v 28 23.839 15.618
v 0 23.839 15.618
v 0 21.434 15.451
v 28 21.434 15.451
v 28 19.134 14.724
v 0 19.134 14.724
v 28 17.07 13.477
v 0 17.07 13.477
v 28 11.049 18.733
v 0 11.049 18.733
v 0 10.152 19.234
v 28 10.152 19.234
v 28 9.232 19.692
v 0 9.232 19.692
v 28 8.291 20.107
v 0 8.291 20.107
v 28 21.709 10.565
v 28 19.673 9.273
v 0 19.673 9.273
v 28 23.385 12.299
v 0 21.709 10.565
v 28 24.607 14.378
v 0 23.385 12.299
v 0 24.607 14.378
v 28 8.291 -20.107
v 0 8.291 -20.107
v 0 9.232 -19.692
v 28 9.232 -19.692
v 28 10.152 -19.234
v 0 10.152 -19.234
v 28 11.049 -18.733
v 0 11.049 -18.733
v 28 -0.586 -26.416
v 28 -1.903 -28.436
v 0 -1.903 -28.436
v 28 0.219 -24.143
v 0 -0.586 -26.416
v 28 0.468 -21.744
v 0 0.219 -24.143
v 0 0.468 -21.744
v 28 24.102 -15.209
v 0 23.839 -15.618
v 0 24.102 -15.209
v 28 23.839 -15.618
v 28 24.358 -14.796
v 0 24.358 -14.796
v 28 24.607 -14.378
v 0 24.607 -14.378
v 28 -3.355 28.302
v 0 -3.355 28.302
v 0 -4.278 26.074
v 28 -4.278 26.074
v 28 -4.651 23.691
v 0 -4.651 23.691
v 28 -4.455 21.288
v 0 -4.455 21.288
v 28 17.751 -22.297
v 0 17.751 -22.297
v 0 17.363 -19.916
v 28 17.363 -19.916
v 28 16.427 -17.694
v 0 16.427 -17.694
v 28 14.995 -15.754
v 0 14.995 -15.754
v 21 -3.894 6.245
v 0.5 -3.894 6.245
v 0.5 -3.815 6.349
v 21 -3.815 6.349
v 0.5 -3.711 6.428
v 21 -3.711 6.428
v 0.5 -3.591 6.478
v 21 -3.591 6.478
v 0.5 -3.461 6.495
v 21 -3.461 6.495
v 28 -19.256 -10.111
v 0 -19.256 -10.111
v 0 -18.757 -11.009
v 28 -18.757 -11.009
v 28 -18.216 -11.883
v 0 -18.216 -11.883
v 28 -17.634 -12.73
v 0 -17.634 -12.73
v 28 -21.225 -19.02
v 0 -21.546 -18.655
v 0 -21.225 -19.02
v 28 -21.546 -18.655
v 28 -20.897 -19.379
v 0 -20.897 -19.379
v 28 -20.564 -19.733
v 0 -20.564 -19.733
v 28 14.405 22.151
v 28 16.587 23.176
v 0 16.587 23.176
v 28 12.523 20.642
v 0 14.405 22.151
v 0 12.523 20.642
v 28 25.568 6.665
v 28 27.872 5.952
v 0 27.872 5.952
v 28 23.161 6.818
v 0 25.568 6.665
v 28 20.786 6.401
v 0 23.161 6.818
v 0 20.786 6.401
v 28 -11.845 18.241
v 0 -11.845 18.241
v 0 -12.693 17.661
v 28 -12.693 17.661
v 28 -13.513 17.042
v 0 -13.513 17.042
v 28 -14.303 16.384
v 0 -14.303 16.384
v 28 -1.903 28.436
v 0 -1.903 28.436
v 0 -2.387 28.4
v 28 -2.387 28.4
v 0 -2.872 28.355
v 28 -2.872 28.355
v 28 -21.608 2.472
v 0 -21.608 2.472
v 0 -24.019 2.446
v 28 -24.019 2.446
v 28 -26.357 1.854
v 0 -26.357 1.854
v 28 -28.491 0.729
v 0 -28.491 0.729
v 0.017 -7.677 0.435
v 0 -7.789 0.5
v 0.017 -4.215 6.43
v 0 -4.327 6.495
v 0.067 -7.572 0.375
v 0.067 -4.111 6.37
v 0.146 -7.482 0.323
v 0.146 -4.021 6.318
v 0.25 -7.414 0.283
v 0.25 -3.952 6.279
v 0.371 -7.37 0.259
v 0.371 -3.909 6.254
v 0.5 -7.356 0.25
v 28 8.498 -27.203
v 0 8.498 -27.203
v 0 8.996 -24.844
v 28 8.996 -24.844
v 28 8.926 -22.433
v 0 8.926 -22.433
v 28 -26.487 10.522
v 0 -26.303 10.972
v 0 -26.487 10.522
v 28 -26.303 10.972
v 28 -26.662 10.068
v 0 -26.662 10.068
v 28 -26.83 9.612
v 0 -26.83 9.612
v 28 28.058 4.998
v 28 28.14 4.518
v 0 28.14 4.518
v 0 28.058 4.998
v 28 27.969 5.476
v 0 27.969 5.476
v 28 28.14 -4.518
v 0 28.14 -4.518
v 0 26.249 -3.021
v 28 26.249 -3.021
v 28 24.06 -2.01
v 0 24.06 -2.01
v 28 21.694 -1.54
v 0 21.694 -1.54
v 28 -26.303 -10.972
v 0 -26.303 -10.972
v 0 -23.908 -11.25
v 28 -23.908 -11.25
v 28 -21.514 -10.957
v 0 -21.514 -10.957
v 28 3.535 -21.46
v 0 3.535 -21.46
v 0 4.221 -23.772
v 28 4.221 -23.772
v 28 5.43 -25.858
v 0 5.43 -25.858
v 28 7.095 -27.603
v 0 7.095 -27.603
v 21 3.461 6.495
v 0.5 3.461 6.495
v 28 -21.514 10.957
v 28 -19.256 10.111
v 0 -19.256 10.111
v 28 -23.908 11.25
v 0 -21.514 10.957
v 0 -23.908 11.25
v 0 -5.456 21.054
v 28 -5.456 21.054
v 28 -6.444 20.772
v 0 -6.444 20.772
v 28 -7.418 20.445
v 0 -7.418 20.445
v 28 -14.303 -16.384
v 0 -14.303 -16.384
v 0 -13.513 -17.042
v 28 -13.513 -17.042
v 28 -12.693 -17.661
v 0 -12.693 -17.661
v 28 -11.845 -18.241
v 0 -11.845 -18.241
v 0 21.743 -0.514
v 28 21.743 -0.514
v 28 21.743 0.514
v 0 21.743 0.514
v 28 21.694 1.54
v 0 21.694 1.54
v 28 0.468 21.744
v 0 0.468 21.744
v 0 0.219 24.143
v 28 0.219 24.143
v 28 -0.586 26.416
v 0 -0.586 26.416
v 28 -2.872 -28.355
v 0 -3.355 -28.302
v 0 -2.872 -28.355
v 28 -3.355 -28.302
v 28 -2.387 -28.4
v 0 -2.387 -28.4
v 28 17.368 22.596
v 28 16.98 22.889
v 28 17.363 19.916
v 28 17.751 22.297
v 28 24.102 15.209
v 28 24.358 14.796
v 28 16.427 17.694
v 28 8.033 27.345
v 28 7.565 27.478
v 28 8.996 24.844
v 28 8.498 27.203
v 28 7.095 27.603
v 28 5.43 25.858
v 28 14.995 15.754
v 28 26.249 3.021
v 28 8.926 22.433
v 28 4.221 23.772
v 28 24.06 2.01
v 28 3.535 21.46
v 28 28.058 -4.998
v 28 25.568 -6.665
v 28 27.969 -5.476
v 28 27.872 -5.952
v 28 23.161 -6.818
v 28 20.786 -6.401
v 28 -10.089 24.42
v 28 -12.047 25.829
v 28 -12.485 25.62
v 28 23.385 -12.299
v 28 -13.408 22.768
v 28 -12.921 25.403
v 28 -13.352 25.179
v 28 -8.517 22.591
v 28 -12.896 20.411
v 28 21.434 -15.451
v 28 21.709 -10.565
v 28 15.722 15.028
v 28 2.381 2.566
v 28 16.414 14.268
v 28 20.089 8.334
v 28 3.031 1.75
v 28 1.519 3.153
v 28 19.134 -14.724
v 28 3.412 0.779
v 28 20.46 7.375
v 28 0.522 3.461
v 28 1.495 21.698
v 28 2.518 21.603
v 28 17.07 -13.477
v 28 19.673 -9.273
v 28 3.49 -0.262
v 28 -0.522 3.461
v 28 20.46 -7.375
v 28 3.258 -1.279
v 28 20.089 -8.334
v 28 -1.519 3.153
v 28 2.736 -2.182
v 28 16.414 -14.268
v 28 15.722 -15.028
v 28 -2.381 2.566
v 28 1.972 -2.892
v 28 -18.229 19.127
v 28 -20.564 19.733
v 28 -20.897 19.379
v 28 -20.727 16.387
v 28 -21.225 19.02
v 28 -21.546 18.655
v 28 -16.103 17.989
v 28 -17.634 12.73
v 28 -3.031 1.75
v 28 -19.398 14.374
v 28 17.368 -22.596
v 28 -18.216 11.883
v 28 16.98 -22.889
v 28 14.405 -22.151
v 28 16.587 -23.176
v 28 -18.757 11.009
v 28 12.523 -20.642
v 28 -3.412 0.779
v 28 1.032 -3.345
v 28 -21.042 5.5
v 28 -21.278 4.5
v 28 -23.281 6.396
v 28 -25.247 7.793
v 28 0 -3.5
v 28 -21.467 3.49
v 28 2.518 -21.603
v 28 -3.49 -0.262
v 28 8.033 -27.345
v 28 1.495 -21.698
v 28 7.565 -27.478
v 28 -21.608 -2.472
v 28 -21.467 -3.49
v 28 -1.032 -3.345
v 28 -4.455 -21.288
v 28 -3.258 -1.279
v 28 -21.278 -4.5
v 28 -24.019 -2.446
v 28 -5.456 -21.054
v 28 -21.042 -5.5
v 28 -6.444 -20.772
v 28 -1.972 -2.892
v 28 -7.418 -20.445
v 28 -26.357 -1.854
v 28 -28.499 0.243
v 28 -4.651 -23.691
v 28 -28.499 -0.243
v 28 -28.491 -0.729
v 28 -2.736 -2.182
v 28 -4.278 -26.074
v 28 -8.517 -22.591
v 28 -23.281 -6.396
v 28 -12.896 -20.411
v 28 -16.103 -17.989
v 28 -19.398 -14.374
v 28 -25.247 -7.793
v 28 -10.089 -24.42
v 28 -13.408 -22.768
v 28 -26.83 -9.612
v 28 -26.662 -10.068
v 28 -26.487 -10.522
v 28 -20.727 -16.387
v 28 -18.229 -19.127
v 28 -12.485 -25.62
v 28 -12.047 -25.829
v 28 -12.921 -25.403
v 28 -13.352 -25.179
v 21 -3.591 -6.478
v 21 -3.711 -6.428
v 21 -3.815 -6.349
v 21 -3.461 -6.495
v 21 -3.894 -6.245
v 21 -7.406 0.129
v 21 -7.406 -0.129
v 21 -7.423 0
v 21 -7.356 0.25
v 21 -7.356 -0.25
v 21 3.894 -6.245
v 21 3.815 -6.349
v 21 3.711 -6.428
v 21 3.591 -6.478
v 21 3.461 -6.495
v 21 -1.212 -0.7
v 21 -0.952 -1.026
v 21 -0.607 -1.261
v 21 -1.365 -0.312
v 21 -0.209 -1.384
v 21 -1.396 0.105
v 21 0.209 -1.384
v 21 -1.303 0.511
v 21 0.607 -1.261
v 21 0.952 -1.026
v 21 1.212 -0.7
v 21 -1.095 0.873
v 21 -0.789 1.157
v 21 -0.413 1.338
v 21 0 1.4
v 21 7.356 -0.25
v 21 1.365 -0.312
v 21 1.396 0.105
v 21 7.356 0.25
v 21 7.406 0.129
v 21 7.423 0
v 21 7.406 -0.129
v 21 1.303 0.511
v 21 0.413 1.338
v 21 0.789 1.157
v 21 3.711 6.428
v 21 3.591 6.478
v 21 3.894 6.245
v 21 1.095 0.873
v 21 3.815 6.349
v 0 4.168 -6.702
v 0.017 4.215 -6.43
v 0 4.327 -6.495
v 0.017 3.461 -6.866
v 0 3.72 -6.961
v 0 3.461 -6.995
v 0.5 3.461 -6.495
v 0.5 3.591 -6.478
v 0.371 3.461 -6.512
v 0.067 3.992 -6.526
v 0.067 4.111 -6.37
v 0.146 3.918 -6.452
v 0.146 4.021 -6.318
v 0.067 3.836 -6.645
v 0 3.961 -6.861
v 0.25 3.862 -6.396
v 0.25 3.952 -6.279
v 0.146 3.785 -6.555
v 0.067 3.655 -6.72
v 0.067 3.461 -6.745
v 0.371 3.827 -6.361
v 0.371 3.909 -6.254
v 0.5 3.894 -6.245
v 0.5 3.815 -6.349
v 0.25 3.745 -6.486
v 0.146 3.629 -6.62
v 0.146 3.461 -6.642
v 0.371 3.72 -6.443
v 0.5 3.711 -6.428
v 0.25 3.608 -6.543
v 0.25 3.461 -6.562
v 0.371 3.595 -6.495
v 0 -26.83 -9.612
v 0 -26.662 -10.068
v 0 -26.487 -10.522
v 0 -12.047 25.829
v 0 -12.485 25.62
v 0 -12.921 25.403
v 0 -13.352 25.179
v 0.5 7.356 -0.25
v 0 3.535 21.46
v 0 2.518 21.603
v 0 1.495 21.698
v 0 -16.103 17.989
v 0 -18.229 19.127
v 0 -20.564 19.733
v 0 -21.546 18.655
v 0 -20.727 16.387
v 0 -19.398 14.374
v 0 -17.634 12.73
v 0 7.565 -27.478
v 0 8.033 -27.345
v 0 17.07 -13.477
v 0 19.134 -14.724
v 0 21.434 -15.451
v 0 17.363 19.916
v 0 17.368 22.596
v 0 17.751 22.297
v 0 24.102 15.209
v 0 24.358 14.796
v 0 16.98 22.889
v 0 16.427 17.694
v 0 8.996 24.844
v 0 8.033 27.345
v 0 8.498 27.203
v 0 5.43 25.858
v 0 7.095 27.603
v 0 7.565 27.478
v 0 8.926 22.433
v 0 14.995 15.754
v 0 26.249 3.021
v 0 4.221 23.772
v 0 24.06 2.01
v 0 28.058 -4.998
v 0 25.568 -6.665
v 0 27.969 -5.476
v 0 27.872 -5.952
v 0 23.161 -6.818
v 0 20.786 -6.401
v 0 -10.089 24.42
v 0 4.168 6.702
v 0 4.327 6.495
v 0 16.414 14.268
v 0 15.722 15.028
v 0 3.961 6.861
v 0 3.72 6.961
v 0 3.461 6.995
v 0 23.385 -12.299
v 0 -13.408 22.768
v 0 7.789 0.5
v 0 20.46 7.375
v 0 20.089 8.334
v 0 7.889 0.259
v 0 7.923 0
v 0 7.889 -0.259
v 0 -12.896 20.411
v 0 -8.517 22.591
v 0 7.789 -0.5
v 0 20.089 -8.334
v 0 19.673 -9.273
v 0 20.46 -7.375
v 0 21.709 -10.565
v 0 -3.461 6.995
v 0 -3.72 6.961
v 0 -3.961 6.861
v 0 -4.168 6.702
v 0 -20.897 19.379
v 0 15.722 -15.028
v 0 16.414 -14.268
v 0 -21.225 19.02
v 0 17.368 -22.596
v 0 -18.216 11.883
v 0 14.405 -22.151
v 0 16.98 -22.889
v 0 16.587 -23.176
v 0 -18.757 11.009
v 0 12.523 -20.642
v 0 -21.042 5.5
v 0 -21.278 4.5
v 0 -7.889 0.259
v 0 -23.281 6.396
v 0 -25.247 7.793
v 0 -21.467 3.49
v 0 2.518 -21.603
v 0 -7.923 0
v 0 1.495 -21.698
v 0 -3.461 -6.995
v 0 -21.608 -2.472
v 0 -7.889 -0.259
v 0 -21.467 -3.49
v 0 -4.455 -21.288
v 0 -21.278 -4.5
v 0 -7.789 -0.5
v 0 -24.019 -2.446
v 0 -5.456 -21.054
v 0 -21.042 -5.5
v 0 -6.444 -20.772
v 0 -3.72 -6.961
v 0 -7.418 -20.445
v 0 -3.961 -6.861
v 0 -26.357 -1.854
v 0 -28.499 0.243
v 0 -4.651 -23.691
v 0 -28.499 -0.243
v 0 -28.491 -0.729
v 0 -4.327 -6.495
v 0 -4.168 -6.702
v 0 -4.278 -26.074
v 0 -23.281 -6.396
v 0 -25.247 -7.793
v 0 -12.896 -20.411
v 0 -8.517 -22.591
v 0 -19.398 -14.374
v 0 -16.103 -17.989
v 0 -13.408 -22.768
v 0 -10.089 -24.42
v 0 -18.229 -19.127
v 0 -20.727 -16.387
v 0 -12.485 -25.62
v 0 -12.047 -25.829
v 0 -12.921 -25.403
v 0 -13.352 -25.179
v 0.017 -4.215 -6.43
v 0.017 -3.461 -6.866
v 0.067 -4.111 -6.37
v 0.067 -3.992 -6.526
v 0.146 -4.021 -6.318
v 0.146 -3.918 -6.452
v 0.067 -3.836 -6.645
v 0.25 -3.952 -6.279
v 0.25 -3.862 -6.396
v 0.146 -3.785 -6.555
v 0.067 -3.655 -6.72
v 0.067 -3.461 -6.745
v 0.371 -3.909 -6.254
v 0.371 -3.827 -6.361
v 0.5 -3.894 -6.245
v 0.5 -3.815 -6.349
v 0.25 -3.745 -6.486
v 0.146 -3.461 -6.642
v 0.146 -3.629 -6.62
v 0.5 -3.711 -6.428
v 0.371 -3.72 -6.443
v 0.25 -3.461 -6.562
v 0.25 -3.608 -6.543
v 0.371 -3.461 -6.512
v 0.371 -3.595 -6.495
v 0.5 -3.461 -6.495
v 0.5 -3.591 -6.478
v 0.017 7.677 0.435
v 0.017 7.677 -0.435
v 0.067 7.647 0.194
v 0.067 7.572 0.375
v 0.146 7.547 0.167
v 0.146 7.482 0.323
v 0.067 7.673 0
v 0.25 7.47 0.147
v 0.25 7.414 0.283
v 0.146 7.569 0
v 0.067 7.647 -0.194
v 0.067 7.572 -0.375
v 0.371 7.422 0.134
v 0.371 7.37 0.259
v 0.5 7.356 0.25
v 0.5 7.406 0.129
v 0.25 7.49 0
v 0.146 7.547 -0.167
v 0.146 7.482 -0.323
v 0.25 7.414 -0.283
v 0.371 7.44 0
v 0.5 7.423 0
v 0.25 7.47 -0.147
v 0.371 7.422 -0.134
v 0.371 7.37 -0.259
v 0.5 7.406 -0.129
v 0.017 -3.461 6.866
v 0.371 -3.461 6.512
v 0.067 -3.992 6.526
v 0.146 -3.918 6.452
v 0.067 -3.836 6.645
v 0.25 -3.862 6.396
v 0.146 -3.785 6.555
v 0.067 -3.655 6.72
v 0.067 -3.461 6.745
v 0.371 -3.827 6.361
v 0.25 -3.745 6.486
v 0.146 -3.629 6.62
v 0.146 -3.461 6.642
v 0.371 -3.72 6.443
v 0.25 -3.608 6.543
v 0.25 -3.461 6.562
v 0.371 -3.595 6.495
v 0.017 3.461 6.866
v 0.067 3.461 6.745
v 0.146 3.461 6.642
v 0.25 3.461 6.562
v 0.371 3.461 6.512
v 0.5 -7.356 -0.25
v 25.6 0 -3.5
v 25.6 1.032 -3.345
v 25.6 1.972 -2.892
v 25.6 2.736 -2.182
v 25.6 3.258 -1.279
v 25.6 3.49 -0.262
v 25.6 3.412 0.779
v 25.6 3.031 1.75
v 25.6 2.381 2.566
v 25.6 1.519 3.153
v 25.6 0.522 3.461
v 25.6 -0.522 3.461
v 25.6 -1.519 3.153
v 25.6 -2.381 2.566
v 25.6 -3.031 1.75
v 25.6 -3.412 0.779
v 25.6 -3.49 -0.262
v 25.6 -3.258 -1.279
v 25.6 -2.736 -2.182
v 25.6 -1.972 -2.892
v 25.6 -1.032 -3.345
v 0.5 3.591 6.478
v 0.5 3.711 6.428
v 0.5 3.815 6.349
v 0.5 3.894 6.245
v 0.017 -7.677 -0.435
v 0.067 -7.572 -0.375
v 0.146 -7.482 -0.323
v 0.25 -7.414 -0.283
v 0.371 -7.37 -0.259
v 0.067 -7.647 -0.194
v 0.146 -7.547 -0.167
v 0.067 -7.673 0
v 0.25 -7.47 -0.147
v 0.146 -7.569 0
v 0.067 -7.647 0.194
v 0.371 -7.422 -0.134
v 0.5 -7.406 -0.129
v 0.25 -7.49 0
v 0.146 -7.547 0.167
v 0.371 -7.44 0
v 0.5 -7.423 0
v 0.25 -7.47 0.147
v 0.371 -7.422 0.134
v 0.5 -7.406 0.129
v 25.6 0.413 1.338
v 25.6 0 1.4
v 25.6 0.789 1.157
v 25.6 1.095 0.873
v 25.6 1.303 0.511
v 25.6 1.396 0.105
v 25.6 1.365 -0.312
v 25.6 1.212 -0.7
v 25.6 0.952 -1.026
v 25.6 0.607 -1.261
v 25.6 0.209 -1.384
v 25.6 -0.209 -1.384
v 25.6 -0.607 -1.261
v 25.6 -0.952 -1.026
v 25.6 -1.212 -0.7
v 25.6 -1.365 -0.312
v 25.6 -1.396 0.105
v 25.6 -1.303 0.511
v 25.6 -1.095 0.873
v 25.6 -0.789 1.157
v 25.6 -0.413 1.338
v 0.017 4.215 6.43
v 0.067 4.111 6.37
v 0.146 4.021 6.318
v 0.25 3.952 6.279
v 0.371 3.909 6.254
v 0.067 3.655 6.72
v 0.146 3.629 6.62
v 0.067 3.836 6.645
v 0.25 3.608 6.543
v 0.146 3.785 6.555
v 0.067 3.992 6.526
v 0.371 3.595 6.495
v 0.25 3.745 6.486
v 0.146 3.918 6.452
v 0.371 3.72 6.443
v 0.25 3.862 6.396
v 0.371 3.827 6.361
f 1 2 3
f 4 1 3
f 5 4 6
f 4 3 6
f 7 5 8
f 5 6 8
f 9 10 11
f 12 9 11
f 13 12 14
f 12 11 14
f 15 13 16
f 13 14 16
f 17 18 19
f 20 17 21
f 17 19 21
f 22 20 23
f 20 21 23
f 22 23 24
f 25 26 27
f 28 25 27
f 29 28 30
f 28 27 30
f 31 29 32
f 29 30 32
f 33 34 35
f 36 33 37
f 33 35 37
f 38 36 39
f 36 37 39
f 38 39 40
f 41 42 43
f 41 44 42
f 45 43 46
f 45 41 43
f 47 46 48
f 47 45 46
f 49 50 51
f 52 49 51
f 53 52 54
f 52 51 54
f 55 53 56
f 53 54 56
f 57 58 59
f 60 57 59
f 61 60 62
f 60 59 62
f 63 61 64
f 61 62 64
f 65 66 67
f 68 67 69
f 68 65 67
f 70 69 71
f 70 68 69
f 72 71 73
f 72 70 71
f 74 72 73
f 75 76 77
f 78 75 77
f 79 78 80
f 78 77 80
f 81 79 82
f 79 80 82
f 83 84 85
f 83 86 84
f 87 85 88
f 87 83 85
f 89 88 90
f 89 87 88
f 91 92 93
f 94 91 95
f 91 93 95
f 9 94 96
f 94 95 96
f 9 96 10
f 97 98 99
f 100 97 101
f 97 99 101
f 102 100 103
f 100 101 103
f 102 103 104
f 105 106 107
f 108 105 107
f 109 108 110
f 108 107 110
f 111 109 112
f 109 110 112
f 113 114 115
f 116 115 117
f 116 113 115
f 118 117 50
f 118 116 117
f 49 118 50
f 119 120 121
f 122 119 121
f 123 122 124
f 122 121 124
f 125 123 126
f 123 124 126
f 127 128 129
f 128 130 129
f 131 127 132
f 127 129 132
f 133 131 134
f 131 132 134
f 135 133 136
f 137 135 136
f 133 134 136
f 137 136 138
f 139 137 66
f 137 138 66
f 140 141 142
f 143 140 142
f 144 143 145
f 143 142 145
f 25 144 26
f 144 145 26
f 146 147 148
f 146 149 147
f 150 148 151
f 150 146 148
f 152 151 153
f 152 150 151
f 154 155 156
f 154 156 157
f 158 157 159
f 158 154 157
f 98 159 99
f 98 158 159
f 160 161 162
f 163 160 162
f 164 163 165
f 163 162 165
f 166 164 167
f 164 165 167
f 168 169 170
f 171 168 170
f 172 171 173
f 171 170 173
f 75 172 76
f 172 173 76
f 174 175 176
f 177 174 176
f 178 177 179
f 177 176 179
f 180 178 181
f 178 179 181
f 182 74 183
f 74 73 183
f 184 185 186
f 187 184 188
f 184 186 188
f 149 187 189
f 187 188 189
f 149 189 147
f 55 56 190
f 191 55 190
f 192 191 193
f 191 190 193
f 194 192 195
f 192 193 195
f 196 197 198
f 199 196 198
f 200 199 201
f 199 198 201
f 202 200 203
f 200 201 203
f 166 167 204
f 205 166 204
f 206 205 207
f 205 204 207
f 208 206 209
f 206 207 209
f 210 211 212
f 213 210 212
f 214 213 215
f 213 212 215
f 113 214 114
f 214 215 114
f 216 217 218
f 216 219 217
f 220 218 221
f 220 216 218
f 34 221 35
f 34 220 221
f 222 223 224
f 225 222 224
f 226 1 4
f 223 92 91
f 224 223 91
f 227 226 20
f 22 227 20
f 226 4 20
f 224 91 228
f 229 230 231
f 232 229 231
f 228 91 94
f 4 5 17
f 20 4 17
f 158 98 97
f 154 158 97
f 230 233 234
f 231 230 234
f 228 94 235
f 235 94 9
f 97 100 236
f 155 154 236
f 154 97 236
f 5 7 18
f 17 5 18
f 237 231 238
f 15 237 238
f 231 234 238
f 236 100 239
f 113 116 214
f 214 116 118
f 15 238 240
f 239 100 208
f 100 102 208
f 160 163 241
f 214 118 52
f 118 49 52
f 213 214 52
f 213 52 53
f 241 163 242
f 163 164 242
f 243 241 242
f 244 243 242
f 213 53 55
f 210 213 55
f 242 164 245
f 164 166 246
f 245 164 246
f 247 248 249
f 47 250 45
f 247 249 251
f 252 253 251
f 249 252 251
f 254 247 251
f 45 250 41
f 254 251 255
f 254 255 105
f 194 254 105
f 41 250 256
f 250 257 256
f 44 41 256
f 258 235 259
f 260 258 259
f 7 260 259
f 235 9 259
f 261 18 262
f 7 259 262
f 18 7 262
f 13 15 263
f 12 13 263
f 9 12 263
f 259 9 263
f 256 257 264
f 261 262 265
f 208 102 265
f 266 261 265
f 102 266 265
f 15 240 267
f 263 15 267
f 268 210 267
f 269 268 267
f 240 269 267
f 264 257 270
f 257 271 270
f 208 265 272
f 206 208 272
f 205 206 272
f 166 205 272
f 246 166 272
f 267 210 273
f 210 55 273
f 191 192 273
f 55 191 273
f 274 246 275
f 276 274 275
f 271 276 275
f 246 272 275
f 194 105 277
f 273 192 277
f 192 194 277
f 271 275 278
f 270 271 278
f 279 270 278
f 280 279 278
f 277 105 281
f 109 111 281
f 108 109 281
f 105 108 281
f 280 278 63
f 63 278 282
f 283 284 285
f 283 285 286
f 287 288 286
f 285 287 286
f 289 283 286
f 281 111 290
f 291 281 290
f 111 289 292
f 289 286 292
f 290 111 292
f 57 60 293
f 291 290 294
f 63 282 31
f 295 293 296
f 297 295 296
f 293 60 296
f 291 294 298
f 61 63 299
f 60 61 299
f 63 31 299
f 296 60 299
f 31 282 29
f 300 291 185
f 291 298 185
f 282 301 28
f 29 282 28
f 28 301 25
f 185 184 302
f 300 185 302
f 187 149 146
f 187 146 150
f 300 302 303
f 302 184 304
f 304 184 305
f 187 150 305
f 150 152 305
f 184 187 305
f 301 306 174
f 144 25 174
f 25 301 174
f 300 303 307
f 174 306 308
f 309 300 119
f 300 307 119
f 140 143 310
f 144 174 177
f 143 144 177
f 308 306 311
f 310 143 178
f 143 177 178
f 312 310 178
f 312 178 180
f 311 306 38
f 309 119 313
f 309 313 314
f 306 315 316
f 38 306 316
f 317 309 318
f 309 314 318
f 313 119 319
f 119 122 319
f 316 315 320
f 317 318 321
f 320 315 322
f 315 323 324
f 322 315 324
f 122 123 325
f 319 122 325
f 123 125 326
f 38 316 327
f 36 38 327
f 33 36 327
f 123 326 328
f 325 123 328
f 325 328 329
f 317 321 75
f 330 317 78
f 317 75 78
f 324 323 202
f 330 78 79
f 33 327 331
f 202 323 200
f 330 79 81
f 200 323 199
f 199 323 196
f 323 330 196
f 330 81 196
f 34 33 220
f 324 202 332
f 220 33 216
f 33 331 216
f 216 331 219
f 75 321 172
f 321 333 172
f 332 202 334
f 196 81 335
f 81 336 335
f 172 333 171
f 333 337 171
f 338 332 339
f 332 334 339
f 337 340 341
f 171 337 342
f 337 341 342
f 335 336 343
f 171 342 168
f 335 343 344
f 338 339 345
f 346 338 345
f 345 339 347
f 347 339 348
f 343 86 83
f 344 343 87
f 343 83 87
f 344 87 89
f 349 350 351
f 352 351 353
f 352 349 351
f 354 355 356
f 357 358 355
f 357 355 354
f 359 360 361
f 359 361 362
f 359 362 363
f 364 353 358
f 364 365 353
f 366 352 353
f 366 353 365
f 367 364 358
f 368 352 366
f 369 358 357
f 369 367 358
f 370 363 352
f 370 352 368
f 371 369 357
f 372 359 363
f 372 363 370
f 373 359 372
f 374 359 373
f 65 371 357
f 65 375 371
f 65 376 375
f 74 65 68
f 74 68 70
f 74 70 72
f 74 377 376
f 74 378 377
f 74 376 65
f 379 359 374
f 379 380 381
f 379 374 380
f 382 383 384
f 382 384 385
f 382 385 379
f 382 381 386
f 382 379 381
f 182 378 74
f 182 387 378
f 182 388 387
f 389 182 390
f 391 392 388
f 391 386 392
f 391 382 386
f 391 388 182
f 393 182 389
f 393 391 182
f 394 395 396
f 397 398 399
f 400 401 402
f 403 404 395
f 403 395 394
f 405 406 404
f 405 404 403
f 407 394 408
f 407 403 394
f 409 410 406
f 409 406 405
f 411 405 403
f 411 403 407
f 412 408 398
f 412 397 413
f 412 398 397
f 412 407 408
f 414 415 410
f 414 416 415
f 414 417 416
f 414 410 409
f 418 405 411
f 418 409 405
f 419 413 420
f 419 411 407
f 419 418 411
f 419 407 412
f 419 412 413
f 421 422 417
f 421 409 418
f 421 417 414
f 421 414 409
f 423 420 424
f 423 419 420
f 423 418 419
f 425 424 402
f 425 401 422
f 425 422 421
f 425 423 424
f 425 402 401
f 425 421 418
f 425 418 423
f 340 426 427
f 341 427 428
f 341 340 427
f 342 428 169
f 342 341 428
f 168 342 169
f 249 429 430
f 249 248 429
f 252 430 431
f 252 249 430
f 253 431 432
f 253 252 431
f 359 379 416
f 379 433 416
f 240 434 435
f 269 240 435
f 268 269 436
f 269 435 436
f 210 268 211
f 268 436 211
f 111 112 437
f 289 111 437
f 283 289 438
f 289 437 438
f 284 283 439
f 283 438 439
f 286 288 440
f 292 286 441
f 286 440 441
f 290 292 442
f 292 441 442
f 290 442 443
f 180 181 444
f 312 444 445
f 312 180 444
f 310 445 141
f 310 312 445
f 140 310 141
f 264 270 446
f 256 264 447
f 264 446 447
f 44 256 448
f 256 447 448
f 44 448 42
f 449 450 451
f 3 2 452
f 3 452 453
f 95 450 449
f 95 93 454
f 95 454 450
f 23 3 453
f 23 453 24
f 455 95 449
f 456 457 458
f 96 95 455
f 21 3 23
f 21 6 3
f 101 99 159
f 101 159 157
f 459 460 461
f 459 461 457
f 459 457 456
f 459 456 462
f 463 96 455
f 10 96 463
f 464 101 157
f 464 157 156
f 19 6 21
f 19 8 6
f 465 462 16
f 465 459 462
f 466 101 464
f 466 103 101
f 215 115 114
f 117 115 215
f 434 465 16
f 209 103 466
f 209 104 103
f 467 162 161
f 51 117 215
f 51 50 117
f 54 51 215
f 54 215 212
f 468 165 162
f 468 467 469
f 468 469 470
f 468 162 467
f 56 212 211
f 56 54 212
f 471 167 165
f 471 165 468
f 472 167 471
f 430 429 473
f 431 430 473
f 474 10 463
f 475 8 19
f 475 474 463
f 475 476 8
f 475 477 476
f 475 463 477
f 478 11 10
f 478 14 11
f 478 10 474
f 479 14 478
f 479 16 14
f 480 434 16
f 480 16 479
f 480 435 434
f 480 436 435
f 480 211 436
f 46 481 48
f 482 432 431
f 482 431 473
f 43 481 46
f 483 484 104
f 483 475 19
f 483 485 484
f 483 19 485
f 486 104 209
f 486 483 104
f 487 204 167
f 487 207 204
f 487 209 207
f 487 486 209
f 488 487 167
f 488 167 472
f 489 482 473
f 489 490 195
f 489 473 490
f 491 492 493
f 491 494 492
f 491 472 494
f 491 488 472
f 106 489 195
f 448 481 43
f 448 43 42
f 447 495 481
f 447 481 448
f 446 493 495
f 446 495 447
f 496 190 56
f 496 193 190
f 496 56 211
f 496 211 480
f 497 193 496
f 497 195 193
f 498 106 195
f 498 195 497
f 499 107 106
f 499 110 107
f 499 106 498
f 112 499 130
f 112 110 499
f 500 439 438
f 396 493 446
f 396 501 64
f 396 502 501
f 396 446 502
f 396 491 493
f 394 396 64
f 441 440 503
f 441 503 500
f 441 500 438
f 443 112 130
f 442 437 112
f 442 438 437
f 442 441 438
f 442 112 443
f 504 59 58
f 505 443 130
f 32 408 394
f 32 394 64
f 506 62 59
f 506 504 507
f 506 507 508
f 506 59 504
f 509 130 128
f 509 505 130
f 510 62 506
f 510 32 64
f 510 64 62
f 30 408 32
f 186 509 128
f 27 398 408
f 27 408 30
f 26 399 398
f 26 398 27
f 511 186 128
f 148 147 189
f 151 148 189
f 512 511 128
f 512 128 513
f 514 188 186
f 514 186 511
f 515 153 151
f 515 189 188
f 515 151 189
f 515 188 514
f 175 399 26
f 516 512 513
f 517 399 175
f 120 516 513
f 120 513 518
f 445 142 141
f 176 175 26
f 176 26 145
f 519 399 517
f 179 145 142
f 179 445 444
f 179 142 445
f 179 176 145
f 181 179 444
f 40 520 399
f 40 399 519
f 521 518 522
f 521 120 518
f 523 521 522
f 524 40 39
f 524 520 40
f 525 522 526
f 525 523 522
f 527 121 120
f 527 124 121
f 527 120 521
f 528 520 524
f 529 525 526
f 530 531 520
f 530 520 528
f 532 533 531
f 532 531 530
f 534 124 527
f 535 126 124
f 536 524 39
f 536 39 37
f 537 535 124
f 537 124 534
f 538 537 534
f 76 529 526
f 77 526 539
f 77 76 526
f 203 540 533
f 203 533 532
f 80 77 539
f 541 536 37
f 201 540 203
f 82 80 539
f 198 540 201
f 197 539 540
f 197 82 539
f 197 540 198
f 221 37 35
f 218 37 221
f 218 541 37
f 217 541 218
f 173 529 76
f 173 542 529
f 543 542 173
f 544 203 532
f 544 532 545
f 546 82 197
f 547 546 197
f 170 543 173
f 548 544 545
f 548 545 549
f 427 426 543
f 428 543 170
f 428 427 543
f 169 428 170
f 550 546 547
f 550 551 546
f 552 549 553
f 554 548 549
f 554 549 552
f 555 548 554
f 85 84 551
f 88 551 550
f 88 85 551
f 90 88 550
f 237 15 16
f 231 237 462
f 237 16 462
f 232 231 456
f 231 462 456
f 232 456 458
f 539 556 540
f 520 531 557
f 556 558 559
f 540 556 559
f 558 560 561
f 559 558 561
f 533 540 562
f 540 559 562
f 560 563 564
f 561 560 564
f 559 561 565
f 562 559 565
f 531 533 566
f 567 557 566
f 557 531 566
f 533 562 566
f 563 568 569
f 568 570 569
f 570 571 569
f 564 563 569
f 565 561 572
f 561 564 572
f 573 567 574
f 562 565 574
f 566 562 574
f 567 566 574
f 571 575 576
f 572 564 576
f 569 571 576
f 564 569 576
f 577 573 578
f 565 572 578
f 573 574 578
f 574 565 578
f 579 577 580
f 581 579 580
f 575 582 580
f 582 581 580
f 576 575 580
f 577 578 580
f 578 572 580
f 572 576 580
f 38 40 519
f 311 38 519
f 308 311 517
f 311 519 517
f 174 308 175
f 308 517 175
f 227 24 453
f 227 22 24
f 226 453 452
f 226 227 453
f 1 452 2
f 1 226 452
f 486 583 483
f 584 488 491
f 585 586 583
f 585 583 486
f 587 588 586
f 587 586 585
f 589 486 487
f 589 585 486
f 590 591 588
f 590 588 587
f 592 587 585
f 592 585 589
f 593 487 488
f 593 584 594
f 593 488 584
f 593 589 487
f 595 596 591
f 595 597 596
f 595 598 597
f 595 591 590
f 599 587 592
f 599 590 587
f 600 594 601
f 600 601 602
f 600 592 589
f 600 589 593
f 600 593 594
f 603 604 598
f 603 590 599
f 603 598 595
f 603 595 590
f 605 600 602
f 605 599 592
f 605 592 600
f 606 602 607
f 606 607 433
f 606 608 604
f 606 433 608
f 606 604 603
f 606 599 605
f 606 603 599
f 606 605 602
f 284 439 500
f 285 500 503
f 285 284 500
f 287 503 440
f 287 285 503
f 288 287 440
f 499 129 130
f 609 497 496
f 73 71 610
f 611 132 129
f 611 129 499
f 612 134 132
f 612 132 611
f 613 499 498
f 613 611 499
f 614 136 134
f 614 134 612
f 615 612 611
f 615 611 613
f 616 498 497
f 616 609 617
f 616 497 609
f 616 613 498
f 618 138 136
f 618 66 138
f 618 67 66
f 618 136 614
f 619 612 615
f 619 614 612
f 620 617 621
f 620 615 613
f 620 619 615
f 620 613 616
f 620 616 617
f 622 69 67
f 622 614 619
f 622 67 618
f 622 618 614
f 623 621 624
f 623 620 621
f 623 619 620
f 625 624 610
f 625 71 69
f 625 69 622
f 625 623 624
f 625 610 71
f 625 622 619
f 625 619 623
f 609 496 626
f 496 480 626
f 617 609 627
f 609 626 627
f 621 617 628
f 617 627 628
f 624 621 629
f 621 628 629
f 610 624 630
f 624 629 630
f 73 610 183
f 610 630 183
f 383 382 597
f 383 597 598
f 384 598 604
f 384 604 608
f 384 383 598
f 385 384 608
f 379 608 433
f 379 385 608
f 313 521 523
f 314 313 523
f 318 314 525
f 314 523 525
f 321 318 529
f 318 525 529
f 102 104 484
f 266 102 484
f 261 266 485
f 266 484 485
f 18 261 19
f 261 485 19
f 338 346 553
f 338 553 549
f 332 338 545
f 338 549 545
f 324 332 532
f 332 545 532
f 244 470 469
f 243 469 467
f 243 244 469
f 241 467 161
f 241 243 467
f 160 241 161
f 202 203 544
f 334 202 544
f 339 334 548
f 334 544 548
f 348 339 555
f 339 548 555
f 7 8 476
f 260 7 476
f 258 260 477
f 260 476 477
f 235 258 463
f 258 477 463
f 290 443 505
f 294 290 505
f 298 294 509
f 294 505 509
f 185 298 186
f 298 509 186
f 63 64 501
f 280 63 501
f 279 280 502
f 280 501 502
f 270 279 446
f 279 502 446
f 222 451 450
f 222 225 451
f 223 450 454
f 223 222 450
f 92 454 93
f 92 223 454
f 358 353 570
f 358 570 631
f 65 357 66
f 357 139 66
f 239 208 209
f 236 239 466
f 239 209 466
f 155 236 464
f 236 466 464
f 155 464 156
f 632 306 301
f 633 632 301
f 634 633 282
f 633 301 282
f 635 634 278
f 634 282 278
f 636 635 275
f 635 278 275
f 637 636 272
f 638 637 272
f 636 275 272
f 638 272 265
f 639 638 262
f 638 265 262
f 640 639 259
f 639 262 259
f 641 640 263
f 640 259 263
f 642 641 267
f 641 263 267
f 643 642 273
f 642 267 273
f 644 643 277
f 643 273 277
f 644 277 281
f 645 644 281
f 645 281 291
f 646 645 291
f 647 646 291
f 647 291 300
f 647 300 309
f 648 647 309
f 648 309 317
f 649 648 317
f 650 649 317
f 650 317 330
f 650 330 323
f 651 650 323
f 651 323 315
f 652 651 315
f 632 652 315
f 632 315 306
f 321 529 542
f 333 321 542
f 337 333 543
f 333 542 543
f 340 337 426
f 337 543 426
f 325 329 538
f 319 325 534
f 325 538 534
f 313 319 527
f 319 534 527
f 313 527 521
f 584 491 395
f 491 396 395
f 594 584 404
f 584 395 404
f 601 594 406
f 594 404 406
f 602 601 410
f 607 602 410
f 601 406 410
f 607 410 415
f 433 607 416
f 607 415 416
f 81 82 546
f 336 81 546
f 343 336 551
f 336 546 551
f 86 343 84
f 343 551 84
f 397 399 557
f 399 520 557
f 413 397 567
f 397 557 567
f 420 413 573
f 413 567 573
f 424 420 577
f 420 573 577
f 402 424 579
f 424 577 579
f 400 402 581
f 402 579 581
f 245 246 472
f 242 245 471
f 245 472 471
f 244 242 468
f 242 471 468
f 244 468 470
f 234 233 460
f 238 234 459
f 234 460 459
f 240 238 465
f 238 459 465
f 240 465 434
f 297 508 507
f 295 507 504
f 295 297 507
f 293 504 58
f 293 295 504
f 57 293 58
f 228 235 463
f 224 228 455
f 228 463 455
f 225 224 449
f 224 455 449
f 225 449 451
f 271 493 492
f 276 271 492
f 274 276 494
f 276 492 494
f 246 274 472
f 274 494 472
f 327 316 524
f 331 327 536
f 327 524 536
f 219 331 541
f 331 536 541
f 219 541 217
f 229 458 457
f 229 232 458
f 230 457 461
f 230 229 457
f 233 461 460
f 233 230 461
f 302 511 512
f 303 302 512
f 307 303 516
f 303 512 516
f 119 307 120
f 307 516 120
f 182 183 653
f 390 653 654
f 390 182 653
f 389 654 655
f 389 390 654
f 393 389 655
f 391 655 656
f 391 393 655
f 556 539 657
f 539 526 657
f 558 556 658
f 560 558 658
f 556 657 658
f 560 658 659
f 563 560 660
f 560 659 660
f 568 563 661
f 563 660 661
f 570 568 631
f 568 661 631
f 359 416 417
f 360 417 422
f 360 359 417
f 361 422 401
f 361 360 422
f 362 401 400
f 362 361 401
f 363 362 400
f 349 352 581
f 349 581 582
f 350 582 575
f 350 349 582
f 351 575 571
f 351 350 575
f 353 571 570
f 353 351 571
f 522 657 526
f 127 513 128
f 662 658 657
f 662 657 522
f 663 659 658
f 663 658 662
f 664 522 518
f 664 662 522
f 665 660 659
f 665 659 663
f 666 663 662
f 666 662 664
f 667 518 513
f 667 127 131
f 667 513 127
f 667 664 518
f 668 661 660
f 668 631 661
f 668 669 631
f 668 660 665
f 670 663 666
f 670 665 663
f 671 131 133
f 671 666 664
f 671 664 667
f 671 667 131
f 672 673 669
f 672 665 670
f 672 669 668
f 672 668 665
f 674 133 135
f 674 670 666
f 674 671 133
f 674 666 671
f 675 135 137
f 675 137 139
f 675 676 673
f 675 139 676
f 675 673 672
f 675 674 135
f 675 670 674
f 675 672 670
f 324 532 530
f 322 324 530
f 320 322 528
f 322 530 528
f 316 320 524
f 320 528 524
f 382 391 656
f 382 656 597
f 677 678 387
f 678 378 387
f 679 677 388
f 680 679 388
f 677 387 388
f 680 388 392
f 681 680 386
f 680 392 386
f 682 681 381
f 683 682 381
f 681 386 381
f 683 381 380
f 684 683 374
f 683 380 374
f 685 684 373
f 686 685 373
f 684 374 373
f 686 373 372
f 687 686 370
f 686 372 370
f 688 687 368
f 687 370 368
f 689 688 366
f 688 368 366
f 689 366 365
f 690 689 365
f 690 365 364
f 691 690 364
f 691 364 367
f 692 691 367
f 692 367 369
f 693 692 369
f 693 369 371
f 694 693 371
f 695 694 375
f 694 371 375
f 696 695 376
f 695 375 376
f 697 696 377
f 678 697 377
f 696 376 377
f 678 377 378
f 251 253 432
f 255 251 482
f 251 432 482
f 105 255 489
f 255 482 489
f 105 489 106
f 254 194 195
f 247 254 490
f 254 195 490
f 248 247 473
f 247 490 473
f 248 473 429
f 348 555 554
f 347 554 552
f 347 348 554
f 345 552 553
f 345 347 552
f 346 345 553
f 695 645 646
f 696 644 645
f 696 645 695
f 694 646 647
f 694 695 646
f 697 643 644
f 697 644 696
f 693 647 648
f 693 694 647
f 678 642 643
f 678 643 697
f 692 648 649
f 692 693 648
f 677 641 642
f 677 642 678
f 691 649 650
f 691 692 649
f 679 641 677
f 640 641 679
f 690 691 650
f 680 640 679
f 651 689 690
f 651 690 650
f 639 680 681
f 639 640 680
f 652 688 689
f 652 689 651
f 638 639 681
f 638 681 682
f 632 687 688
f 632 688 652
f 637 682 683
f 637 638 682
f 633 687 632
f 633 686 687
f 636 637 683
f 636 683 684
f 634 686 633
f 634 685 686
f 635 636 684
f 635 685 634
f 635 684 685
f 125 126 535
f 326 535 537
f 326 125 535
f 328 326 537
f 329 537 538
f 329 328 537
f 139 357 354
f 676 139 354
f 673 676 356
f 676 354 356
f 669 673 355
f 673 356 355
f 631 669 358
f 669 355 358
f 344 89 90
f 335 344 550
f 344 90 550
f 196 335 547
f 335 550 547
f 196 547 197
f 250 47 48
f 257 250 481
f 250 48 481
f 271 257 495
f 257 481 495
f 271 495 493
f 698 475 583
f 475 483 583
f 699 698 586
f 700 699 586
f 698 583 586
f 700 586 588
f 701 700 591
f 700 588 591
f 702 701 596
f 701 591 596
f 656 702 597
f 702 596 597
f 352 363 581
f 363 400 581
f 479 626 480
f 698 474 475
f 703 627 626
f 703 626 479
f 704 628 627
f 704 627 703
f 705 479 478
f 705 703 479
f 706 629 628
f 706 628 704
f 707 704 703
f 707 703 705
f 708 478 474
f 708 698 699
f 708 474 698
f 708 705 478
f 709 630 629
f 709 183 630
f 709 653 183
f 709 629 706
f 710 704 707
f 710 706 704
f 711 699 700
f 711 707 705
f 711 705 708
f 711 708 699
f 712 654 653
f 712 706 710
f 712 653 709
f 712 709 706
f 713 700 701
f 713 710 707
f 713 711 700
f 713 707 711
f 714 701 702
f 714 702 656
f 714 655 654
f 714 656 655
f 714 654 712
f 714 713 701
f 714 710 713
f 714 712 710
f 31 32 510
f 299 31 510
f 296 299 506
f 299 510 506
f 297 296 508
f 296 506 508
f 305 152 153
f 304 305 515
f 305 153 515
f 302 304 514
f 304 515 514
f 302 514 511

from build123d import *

# Parameters (mm, degrees)
BASPROSKE_W                              = 28
BASPROSKE_H                              = 28.5
TOOTHCUT_DEPTH                           = 50.076470941
TEETHCUTS_COUNT                          = 17
TEETHCUTS_ANGLE                          = 338.823529412
BORSKE_R                                 = 0.4
BORE_DEPTH                               = 50.0000508
CUT_EXTRUDE1_DEPTH                       = 21
CBORE_FOR_M3_PAN_HEAD_SCREW1_D           = 2.8
CBORE_FOR_M3_PAN_HEAD_SCREW1_CBORE_D     = 7
CBORE_FOR_M3_PAN_HEAD_SCREW1_CBORE_DEPTH = 2.4
FILLET1_R                                = 0.5


with BuildPart() as part:
    # BasProSke → Base-Revolve (revolve)
    with BuildSketch(Plane(origin=(0, 0, 0), x_dir=(1, 0, 0), z_dir=(0, 1, 0)), mode=Mode.PRIVATE) as base_revolve_sk:
        with Locations((14, 14.25)):
            Rectangle(BASPROSKE_W, BASPROSKE_H)
    revolve(base_revolve_sk.sketch.rotate(Axis((-10, 0, 0), (1, 0, 0)), 180), axis=Axis((-10, 0, 0), (1, 0, 0)))

    # TooCutSke → ToothCut (cut, through all)
    with BuildSketch(Plane(origin=(0, 0, 0), x_dir=(0, 0, -1), z_dir=(1, 0, 0))):
        with BuildLine():
            ThreePointArc((1.540279816, 21.694389576), (0, 21.749), (-1.540279816, 21.694389576))
            ThreePointArc((-1.540279816, 21.694389576), (-2.457007956, 25.198716871), (-4.540621854, 28.161697363))
            ThreePointArc((-4.540621854, 28.161697363), (0, 28.5254), (4.540621854, 28.161697363))
            ThreePointArc((4.540621854, 28.161697363), (2.457007956, 25.198716871), (1.540279816, 21.694389576))
        make_face()
    toothcut = extrude(amount=TOOTHCUT_DEPTH, mode=Mode.SUBTRACT)

    # TeethCuts: ToothCut ×17 about axis
    teethcuts_axis = Axis((-10, 0, 0), (1, 0, 0))
    for i in range(1, TEETHCUTS_COUNT):
        add(toothcut.rotate(teethcuts_axis, i * TEETHCUTS_ANGLE / (TEETHCUTS_COUNT - 1)), mode=Mode.SUBTRACT)

    # BorSke → Bore (cut, symmetric)
    with BuildSketch(Plane(origin=(0, 0, 0), x_dir=(0, 0, -1), z_dir=(1, 0, 0))):
        with Locations(Location((0, 0, 0), (0, 0, 180))):
            Circle(BORSKE_R)
    extrude(amount=BORE_DEPTH, both=True, mode=Mode.SUBTRACT)

    # Sketch1 → Cut-Extrude1 (cut)
    with BuildSketch(Plane.ZY):
        Polygon((0, -7.5), (6.495190528, -3.75), (6.495190528, 3.75), (0, 7.5), (-6.495190528, 3.75), (-6.495190528, -3.75), align=None)
    extrude(amount=-CUT_EXTRUDE1_DEPTH, mode=Mode.SUBTRACT)

    # CBORE for M3 Pan Head Screw1 (through all)
    with Locations(Plane(origin=(28, 0, 0), x_dir=(0, 0, -1), z_dir=(1, 0, 0))):
        with Locations((0, 0)):
            CounterBoreHole(CBORE_FOR_M3_PAN_HEAD_SCREW1_D / 2, CBORE_FOR_M3_PAN_HEAD_SCREW1_CBORE_D / 2, CBORE_FOR_M3_PAN_HEAD_SCREW1_CBORE_DEPTH)

    # Fillet1
    fillet1_edges = [part.edges().sort_by_distance(p)[0] for p in [
        (10.5, -7.5, 0),
        (10.5, -3.75, -6.495190528),
        (10.5, 3.75, -6.495190528),
        (10.5, 7.5, 0),
        (10.5, 3.75, 6.495190528),
        (10.5, -3.75, 6.495190528),
        (0, -5.625, -3.247595264),
        (0, -5.625, 3.247595264),
        (0, 0, 6.495190528),
        (0, 5.625, 3.247595264),
        (0, 5.625, -3.247595264),
        (0, 0, -6.495190528),
    ]]
    fillet(fillet1_edges, radius=FILLET1_R)


solid = part.part
